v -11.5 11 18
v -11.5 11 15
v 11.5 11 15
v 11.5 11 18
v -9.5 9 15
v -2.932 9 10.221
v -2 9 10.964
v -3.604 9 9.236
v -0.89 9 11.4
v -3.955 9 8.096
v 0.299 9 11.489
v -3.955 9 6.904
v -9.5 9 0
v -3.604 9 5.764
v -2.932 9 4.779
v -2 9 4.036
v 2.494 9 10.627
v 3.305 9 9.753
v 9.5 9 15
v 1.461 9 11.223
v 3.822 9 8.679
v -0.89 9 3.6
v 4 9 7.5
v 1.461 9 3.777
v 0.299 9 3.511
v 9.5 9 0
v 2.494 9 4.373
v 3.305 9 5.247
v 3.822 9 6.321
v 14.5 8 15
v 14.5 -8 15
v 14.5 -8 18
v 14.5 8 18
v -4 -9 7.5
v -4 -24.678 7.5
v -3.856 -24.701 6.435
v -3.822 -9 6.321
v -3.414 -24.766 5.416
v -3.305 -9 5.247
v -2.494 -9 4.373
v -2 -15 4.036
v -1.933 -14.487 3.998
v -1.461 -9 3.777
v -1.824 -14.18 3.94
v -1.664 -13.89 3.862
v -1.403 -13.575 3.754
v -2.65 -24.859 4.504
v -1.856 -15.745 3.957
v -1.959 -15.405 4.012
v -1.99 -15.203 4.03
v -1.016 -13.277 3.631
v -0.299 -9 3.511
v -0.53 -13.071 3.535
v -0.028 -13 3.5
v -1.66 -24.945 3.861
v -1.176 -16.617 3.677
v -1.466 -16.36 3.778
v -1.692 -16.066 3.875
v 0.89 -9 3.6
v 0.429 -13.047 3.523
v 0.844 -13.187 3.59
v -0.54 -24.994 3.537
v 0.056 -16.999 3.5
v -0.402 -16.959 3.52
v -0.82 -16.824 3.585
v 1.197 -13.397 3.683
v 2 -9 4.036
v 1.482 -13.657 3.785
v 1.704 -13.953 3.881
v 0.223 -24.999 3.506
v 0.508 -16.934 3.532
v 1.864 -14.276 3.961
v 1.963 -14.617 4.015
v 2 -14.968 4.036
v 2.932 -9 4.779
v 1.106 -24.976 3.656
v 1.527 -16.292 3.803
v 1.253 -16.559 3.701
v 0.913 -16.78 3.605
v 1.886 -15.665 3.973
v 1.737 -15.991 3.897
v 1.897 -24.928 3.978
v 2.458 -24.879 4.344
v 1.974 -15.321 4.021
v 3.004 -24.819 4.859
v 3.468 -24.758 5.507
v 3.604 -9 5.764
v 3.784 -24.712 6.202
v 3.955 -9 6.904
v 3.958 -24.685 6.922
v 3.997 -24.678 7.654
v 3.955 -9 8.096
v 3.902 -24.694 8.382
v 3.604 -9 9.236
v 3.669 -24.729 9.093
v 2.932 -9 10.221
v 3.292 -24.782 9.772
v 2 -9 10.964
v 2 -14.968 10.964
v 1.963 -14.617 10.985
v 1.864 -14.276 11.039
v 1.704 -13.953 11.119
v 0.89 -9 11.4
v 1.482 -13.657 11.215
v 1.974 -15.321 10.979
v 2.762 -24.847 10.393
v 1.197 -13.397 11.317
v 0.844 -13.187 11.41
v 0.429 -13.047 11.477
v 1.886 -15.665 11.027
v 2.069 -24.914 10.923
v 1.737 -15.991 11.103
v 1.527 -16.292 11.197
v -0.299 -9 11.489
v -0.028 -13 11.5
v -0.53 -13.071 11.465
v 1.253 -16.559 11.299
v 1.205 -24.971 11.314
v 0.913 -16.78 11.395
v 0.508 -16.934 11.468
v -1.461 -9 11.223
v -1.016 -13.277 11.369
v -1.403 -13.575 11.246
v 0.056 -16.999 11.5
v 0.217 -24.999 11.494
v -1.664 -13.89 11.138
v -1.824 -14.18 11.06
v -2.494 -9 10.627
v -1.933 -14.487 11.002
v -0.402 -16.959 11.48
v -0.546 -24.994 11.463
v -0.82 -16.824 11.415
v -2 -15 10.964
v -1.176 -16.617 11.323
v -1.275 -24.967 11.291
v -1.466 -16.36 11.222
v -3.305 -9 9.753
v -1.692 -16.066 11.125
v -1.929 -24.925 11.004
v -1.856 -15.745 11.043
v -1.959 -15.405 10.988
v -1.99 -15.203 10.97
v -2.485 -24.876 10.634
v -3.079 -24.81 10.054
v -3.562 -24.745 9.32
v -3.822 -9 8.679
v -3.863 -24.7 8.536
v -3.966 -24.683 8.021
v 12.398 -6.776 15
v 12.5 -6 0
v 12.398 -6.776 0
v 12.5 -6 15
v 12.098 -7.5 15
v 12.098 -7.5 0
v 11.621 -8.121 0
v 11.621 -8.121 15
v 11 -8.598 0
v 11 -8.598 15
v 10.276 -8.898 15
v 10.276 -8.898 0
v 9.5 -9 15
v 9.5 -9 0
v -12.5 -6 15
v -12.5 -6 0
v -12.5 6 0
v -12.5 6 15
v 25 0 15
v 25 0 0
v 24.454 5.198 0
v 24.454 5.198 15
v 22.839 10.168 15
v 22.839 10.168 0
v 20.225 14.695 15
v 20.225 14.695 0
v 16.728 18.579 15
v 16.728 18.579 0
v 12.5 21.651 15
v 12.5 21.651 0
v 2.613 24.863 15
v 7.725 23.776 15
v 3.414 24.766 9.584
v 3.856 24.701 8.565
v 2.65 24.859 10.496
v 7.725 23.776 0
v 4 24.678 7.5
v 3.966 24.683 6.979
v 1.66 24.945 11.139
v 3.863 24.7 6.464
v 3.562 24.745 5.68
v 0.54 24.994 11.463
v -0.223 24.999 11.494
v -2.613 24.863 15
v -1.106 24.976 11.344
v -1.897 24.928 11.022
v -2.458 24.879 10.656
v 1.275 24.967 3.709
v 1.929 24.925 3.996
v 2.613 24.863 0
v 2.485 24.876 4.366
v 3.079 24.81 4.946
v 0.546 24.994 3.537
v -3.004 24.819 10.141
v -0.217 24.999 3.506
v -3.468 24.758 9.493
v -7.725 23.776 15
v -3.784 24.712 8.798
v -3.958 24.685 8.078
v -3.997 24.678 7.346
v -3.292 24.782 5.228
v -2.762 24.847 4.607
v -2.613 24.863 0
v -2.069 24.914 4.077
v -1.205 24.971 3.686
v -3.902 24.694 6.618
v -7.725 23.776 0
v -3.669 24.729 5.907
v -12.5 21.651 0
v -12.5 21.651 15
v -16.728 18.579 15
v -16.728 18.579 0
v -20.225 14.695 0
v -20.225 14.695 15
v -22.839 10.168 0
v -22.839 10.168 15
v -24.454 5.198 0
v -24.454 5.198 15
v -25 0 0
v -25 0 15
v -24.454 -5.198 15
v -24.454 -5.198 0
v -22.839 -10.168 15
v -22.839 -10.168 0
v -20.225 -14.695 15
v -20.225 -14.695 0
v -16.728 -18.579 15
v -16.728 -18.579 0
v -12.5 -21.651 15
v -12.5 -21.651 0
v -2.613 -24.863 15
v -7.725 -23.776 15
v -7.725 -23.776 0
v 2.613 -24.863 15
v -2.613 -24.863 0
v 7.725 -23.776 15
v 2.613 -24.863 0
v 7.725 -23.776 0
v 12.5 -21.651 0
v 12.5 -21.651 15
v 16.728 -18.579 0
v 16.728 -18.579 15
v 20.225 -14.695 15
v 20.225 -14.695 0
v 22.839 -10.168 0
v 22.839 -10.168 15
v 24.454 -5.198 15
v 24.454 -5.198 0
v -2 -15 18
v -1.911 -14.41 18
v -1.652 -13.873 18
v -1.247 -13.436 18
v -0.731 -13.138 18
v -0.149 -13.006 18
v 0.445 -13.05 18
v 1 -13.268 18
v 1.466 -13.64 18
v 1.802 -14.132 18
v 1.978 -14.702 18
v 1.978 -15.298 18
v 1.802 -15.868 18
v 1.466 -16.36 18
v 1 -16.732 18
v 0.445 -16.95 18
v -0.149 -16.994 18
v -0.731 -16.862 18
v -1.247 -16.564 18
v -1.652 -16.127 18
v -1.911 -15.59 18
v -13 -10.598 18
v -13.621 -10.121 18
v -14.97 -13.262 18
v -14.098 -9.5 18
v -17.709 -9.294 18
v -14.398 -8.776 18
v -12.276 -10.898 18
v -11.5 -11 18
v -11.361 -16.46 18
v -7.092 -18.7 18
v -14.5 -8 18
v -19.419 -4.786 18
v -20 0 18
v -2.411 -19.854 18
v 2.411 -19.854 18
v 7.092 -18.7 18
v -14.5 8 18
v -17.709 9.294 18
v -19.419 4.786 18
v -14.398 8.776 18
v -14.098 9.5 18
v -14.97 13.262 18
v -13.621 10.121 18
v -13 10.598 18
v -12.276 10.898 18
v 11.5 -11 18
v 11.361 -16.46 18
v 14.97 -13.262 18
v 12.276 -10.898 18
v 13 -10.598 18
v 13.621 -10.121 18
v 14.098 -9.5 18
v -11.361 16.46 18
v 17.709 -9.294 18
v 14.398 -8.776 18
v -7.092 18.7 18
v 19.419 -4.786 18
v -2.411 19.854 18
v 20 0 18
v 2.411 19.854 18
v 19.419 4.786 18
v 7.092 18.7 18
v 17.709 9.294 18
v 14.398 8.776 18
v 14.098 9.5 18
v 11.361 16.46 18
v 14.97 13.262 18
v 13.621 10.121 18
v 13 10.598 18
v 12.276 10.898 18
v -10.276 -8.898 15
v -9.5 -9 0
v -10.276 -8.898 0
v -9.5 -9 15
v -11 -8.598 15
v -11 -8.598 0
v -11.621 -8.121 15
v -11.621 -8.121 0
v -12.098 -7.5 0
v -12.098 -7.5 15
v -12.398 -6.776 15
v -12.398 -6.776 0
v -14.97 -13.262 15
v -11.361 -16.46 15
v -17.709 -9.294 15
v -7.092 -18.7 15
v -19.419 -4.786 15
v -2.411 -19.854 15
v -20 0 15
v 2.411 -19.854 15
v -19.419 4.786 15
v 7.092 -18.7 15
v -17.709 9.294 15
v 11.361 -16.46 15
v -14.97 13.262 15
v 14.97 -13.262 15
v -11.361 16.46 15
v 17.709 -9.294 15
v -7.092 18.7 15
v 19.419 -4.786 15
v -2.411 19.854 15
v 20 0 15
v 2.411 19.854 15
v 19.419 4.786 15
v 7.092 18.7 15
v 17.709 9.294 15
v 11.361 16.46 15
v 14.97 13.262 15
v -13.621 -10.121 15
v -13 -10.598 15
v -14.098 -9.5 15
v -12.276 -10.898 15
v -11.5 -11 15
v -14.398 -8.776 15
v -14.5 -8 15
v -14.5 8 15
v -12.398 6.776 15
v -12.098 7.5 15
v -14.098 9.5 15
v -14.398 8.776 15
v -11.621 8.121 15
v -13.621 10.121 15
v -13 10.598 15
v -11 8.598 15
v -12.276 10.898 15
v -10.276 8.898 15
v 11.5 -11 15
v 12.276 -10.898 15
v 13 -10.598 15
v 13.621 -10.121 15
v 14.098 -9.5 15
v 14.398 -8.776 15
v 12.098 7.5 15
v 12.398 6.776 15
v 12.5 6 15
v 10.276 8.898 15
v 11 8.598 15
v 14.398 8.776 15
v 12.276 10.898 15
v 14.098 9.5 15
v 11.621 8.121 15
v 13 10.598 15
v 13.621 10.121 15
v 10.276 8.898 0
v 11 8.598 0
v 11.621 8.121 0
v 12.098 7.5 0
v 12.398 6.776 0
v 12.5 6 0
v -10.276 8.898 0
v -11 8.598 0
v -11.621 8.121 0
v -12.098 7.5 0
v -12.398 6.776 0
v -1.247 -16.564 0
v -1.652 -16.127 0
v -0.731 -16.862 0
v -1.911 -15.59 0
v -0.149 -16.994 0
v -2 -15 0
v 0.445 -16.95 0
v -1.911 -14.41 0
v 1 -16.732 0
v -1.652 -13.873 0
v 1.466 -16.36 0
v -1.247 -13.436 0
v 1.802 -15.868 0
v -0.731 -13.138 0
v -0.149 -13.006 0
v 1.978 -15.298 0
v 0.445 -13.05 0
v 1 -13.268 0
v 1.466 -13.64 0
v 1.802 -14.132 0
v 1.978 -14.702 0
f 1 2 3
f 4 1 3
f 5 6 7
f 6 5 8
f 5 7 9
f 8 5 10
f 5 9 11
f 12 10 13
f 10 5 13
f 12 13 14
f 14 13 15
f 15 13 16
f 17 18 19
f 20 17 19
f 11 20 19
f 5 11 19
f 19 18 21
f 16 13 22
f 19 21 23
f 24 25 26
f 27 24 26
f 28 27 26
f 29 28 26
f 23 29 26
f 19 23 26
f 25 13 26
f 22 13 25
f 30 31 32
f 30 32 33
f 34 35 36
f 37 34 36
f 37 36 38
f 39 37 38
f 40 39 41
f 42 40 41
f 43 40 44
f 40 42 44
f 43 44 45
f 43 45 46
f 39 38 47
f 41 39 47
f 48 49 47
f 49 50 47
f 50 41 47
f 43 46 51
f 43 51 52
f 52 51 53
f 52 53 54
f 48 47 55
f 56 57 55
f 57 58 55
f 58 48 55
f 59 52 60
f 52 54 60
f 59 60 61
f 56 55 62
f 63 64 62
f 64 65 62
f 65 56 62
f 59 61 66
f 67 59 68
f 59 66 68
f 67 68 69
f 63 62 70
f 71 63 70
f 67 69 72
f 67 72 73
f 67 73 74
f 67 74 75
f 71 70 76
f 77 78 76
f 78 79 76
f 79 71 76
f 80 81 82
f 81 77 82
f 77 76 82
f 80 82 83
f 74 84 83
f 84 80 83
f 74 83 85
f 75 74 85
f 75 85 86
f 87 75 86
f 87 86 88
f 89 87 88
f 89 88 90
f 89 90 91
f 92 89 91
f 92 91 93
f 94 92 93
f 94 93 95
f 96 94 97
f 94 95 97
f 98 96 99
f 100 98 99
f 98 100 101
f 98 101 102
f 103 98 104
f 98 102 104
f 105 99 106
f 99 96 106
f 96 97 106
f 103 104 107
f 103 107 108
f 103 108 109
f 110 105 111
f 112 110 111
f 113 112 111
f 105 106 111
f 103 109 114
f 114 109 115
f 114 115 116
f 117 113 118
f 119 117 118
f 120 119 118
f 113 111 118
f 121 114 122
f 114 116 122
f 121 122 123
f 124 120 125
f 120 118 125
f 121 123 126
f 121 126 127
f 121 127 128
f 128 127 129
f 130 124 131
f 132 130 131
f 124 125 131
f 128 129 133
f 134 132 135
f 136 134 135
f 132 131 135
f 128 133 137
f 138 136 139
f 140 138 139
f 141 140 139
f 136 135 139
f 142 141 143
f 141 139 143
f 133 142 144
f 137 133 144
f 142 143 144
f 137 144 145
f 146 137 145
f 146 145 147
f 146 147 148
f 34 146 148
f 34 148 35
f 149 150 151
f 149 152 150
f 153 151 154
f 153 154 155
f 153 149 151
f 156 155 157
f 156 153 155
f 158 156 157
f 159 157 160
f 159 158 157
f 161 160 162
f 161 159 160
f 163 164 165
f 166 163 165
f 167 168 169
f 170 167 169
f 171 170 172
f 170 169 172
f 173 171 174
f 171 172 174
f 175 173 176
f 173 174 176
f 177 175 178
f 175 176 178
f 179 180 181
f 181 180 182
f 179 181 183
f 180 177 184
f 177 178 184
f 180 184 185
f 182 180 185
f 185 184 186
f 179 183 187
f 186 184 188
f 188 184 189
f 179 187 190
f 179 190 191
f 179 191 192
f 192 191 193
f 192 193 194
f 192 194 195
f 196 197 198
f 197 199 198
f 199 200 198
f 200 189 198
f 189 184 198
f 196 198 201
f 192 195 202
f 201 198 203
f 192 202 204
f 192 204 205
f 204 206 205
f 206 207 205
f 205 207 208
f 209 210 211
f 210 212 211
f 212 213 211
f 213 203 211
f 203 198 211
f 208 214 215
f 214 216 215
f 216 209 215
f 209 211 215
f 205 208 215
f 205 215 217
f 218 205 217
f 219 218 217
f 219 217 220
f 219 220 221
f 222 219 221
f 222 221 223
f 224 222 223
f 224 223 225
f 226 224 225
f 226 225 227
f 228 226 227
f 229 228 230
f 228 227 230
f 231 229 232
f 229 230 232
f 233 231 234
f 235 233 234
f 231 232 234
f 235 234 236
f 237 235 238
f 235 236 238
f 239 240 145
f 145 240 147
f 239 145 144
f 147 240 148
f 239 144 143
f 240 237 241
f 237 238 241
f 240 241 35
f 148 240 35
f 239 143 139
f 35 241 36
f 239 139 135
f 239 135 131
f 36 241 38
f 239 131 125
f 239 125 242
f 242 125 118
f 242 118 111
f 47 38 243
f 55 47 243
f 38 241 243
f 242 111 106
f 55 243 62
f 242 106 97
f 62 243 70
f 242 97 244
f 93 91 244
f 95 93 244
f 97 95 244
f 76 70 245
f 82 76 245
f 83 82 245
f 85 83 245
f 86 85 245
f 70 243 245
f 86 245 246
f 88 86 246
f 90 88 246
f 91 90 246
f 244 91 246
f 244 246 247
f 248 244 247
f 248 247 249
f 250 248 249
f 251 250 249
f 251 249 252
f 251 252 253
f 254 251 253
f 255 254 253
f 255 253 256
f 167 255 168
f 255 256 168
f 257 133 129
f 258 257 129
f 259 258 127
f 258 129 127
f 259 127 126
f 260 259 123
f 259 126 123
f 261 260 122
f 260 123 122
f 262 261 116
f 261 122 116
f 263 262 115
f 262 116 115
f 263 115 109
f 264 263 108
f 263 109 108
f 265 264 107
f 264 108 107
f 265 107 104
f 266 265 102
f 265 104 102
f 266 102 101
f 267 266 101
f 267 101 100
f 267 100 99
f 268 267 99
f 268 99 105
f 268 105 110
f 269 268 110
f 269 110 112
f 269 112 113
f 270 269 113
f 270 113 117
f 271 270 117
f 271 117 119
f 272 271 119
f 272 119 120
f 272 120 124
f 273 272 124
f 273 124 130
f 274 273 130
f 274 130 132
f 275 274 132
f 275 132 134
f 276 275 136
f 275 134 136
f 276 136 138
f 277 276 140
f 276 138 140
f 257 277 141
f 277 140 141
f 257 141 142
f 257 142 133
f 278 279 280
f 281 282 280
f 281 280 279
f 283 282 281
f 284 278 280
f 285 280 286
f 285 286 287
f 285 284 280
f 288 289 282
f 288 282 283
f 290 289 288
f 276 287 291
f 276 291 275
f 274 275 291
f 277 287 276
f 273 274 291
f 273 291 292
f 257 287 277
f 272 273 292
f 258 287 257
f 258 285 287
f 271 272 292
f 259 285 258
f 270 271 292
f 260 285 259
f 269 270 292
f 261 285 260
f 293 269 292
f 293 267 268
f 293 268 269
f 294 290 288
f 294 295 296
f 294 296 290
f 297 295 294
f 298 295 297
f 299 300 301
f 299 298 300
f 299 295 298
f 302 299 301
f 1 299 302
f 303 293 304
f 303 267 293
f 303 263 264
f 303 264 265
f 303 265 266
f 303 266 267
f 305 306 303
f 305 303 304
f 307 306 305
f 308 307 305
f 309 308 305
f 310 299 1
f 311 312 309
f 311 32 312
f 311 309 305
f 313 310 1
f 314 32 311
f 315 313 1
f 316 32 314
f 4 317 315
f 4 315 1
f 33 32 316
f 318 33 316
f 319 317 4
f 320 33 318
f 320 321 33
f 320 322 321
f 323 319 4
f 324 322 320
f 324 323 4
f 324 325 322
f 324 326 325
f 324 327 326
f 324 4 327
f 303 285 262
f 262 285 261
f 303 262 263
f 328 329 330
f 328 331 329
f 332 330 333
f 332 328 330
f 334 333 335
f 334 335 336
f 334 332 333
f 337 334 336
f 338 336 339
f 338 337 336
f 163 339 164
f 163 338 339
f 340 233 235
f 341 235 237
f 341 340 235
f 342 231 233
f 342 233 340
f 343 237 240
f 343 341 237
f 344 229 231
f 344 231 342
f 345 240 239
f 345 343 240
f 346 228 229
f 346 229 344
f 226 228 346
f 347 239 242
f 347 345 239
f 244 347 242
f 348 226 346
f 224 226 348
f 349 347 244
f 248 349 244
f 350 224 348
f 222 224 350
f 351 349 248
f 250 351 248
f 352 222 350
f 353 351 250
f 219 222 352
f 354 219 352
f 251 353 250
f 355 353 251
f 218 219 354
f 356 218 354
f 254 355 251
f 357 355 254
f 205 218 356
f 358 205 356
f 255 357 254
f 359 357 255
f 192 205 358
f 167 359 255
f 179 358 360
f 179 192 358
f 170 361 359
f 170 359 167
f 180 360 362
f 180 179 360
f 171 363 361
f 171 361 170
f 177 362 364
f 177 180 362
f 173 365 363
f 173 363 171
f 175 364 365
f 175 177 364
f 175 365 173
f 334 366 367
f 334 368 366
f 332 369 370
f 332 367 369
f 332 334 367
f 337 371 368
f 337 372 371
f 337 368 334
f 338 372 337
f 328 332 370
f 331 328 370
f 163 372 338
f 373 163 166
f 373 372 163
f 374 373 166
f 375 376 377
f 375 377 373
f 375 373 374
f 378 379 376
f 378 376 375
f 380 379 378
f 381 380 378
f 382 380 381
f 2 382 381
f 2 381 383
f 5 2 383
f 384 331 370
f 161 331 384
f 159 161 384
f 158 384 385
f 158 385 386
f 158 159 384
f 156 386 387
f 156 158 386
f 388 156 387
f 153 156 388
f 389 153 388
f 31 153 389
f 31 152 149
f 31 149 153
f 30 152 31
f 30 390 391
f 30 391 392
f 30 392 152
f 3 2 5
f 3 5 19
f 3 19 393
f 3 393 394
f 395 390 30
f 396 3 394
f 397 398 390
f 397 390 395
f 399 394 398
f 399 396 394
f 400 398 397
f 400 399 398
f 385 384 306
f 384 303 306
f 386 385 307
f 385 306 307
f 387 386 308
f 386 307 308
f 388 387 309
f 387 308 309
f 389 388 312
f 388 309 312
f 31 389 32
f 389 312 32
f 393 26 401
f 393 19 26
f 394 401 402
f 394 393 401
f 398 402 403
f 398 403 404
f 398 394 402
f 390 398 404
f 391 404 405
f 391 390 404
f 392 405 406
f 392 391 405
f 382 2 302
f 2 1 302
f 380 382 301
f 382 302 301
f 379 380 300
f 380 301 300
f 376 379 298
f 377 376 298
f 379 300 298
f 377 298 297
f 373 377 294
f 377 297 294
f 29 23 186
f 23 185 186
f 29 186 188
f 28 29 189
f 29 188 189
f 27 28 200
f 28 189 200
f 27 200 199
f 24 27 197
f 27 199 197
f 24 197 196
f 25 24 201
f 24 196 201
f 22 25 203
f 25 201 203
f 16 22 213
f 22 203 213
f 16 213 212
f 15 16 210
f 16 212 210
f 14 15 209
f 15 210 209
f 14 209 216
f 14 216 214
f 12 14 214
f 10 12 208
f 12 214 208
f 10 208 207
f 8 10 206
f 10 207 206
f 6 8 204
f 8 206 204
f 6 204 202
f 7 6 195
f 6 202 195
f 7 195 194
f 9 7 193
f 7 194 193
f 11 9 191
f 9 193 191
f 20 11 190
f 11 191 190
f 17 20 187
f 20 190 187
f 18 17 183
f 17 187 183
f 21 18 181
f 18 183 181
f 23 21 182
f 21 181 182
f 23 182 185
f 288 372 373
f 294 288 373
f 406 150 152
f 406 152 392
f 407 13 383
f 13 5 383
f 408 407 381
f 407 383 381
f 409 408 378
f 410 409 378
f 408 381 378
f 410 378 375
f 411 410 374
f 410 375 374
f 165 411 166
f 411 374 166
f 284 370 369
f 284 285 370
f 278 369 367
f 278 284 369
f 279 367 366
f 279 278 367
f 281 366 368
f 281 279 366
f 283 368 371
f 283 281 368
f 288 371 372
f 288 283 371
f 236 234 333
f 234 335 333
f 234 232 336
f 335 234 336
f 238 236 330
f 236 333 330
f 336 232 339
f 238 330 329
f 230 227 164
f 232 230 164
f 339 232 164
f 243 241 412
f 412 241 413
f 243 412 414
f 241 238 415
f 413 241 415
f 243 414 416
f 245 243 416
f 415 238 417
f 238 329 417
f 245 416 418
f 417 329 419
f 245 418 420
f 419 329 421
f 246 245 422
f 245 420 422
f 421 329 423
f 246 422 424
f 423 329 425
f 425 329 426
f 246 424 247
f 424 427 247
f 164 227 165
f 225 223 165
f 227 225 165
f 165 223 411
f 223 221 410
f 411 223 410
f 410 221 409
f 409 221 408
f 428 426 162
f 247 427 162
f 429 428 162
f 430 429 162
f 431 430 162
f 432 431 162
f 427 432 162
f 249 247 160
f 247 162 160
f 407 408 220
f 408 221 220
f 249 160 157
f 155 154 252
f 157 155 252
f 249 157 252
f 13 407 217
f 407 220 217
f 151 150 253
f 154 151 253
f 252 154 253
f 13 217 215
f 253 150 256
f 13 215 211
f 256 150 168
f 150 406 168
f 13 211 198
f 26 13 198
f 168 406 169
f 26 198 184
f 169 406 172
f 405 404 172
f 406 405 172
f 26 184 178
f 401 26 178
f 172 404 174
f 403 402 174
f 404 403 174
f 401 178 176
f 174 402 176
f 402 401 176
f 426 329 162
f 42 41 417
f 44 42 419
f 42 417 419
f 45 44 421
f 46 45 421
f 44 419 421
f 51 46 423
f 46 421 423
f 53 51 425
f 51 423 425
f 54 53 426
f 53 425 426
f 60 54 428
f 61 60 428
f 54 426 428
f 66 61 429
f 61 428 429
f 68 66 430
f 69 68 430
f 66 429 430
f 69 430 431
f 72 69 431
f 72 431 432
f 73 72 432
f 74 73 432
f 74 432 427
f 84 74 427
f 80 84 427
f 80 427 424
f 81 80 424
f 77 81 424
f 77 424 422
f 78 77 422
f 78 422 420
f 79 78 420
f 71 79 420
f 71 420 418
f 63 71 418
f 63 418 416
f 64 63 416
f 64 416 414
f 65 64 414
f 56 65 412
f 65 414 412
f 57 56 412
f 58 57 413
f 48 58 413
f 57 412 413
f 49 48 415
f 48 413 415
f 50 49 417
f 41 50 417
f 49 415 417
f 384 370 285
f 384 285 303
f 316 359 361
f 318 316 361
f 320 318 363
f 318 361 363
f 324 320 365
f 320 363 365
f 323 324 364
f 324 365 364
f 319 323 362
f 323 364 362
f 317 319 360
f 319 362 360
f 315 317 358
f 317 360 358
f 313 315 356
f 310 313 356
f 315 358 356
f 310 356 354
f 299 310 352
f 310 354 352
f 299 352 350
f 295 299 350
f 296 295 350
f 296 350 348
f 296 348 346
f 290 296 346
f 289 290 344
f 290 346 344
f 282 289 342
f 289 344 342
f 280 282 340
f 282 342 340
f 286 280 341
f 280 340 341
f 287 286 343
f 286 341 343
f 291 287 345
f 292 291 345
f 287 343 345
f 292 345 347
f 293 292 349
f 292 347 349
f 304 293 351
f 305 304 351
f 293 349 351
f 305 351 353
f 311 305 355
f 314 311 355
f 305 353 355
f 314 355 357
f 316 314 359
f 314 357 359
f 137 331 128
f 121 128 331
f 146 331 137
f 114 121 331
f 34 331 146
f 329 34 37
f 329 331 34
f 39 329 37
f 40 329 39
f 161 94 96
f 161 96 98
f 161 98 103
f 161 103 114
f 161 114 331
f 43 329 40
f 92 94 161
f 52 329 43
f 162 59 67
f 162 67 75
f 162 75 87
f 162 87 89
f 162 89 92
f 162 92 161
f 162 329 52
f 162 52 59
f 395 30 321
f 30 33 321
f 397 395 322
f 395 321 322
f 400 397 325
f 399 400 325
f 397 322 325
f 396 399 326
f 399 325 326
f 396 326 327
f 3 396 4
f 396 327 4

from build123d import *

# Parameters (mm, degrees)
SKETCH1_R                 = 25
SKETCH1_W                 = 25
SKETCH1_H                 = 18
BOSS_EXTRUDE1_DEPTH       = 15
SKETCH2_R                 = 20
SKETCH2_W                 = 29
SKETCH2_H                 = 22
BOSS_EXTRUDE2_DEPTH       = 3
F_4_0MM_DOWEL_HOLE1_D     = 4
F_8_0MM_DOWEL_HOLE1_D     = 8
F_8_0MM_DOWEL_HOLE1_DEPTH = 16
F_8_0MM_DOWEL_HOLE2_D     = 8
FILLET1_R                 = 3


with BuildPart() as part:
    # Sketch1 → Boss-Extrude1 (new body)
    with BuildSketch(Plane.XY):
        Circle(SKETCH1_R)
        Rectangle(SKETCH1_W, SKETCH1_H, mode=Mode.SUBTRACT)
    extrude(amount=BOSS_EXTRUDE1_DEPTH)

    # Sketch2 → Boss-Extrude2 (add)
    with BuildSketch(Plane.XY.offset(15)):
        Circle(SKETCH2_R)
        Rectangle(SKETCH2_W, SKETCH2_H, mode=Mode.SUBTRACT)
    extrude(amount=BOSS_EXTRUDE2_DEPTH)

    # Ø4.0mm Dowel Hole1 (through all)
    with Locations(Plane.XY.offset(18)):
        with Locations((0, -15)):
            Hole(F_4_0MM_DOWEL_HOLE1_D / 2)

    # Ø8.0mm Dowel Hole1
    with Locations(Plane(origin=(0, 9, 0), x_dir=(-1, 0, 0), z_dir=(0, -1, 0))):
        with Locations((0, -7.5)):
            Hole(F_8_0MM_DOWEL_HOLE1_D / 2, depth=F_8_0MM_DOWEL_HOLE1_DEPTH)

    # Ø8.0mm Dowel Hole2 (through all)
    with Locations(Plane(origin=(0, -9, 0), x_dir=(1, 0, 0), z_dir=(0, 1, 0))):
        with Locations((0, -7.5)):
            Hole(F_8_0MM_DOWEL_HOLE2_D / 2)

    # Fillet1
    fillet1_edges = [part.edges().sort_by_distance(p)[0] for p in [
        (14.5, 11, 16.5),
        (-14.5, 11, 16.5),
        (-14.5, -11, 16.5),
        (14.5, -11, 16.5),
        (-12.5, 9, 7.5),
        (-12.5, -9, 7.5),
        (12.5, -9, 7.5),
        (12.5, 9, 7.5),
    ]]
    fillet(fillet1_edges, radius=FILLET1_R)


solid = part.part
